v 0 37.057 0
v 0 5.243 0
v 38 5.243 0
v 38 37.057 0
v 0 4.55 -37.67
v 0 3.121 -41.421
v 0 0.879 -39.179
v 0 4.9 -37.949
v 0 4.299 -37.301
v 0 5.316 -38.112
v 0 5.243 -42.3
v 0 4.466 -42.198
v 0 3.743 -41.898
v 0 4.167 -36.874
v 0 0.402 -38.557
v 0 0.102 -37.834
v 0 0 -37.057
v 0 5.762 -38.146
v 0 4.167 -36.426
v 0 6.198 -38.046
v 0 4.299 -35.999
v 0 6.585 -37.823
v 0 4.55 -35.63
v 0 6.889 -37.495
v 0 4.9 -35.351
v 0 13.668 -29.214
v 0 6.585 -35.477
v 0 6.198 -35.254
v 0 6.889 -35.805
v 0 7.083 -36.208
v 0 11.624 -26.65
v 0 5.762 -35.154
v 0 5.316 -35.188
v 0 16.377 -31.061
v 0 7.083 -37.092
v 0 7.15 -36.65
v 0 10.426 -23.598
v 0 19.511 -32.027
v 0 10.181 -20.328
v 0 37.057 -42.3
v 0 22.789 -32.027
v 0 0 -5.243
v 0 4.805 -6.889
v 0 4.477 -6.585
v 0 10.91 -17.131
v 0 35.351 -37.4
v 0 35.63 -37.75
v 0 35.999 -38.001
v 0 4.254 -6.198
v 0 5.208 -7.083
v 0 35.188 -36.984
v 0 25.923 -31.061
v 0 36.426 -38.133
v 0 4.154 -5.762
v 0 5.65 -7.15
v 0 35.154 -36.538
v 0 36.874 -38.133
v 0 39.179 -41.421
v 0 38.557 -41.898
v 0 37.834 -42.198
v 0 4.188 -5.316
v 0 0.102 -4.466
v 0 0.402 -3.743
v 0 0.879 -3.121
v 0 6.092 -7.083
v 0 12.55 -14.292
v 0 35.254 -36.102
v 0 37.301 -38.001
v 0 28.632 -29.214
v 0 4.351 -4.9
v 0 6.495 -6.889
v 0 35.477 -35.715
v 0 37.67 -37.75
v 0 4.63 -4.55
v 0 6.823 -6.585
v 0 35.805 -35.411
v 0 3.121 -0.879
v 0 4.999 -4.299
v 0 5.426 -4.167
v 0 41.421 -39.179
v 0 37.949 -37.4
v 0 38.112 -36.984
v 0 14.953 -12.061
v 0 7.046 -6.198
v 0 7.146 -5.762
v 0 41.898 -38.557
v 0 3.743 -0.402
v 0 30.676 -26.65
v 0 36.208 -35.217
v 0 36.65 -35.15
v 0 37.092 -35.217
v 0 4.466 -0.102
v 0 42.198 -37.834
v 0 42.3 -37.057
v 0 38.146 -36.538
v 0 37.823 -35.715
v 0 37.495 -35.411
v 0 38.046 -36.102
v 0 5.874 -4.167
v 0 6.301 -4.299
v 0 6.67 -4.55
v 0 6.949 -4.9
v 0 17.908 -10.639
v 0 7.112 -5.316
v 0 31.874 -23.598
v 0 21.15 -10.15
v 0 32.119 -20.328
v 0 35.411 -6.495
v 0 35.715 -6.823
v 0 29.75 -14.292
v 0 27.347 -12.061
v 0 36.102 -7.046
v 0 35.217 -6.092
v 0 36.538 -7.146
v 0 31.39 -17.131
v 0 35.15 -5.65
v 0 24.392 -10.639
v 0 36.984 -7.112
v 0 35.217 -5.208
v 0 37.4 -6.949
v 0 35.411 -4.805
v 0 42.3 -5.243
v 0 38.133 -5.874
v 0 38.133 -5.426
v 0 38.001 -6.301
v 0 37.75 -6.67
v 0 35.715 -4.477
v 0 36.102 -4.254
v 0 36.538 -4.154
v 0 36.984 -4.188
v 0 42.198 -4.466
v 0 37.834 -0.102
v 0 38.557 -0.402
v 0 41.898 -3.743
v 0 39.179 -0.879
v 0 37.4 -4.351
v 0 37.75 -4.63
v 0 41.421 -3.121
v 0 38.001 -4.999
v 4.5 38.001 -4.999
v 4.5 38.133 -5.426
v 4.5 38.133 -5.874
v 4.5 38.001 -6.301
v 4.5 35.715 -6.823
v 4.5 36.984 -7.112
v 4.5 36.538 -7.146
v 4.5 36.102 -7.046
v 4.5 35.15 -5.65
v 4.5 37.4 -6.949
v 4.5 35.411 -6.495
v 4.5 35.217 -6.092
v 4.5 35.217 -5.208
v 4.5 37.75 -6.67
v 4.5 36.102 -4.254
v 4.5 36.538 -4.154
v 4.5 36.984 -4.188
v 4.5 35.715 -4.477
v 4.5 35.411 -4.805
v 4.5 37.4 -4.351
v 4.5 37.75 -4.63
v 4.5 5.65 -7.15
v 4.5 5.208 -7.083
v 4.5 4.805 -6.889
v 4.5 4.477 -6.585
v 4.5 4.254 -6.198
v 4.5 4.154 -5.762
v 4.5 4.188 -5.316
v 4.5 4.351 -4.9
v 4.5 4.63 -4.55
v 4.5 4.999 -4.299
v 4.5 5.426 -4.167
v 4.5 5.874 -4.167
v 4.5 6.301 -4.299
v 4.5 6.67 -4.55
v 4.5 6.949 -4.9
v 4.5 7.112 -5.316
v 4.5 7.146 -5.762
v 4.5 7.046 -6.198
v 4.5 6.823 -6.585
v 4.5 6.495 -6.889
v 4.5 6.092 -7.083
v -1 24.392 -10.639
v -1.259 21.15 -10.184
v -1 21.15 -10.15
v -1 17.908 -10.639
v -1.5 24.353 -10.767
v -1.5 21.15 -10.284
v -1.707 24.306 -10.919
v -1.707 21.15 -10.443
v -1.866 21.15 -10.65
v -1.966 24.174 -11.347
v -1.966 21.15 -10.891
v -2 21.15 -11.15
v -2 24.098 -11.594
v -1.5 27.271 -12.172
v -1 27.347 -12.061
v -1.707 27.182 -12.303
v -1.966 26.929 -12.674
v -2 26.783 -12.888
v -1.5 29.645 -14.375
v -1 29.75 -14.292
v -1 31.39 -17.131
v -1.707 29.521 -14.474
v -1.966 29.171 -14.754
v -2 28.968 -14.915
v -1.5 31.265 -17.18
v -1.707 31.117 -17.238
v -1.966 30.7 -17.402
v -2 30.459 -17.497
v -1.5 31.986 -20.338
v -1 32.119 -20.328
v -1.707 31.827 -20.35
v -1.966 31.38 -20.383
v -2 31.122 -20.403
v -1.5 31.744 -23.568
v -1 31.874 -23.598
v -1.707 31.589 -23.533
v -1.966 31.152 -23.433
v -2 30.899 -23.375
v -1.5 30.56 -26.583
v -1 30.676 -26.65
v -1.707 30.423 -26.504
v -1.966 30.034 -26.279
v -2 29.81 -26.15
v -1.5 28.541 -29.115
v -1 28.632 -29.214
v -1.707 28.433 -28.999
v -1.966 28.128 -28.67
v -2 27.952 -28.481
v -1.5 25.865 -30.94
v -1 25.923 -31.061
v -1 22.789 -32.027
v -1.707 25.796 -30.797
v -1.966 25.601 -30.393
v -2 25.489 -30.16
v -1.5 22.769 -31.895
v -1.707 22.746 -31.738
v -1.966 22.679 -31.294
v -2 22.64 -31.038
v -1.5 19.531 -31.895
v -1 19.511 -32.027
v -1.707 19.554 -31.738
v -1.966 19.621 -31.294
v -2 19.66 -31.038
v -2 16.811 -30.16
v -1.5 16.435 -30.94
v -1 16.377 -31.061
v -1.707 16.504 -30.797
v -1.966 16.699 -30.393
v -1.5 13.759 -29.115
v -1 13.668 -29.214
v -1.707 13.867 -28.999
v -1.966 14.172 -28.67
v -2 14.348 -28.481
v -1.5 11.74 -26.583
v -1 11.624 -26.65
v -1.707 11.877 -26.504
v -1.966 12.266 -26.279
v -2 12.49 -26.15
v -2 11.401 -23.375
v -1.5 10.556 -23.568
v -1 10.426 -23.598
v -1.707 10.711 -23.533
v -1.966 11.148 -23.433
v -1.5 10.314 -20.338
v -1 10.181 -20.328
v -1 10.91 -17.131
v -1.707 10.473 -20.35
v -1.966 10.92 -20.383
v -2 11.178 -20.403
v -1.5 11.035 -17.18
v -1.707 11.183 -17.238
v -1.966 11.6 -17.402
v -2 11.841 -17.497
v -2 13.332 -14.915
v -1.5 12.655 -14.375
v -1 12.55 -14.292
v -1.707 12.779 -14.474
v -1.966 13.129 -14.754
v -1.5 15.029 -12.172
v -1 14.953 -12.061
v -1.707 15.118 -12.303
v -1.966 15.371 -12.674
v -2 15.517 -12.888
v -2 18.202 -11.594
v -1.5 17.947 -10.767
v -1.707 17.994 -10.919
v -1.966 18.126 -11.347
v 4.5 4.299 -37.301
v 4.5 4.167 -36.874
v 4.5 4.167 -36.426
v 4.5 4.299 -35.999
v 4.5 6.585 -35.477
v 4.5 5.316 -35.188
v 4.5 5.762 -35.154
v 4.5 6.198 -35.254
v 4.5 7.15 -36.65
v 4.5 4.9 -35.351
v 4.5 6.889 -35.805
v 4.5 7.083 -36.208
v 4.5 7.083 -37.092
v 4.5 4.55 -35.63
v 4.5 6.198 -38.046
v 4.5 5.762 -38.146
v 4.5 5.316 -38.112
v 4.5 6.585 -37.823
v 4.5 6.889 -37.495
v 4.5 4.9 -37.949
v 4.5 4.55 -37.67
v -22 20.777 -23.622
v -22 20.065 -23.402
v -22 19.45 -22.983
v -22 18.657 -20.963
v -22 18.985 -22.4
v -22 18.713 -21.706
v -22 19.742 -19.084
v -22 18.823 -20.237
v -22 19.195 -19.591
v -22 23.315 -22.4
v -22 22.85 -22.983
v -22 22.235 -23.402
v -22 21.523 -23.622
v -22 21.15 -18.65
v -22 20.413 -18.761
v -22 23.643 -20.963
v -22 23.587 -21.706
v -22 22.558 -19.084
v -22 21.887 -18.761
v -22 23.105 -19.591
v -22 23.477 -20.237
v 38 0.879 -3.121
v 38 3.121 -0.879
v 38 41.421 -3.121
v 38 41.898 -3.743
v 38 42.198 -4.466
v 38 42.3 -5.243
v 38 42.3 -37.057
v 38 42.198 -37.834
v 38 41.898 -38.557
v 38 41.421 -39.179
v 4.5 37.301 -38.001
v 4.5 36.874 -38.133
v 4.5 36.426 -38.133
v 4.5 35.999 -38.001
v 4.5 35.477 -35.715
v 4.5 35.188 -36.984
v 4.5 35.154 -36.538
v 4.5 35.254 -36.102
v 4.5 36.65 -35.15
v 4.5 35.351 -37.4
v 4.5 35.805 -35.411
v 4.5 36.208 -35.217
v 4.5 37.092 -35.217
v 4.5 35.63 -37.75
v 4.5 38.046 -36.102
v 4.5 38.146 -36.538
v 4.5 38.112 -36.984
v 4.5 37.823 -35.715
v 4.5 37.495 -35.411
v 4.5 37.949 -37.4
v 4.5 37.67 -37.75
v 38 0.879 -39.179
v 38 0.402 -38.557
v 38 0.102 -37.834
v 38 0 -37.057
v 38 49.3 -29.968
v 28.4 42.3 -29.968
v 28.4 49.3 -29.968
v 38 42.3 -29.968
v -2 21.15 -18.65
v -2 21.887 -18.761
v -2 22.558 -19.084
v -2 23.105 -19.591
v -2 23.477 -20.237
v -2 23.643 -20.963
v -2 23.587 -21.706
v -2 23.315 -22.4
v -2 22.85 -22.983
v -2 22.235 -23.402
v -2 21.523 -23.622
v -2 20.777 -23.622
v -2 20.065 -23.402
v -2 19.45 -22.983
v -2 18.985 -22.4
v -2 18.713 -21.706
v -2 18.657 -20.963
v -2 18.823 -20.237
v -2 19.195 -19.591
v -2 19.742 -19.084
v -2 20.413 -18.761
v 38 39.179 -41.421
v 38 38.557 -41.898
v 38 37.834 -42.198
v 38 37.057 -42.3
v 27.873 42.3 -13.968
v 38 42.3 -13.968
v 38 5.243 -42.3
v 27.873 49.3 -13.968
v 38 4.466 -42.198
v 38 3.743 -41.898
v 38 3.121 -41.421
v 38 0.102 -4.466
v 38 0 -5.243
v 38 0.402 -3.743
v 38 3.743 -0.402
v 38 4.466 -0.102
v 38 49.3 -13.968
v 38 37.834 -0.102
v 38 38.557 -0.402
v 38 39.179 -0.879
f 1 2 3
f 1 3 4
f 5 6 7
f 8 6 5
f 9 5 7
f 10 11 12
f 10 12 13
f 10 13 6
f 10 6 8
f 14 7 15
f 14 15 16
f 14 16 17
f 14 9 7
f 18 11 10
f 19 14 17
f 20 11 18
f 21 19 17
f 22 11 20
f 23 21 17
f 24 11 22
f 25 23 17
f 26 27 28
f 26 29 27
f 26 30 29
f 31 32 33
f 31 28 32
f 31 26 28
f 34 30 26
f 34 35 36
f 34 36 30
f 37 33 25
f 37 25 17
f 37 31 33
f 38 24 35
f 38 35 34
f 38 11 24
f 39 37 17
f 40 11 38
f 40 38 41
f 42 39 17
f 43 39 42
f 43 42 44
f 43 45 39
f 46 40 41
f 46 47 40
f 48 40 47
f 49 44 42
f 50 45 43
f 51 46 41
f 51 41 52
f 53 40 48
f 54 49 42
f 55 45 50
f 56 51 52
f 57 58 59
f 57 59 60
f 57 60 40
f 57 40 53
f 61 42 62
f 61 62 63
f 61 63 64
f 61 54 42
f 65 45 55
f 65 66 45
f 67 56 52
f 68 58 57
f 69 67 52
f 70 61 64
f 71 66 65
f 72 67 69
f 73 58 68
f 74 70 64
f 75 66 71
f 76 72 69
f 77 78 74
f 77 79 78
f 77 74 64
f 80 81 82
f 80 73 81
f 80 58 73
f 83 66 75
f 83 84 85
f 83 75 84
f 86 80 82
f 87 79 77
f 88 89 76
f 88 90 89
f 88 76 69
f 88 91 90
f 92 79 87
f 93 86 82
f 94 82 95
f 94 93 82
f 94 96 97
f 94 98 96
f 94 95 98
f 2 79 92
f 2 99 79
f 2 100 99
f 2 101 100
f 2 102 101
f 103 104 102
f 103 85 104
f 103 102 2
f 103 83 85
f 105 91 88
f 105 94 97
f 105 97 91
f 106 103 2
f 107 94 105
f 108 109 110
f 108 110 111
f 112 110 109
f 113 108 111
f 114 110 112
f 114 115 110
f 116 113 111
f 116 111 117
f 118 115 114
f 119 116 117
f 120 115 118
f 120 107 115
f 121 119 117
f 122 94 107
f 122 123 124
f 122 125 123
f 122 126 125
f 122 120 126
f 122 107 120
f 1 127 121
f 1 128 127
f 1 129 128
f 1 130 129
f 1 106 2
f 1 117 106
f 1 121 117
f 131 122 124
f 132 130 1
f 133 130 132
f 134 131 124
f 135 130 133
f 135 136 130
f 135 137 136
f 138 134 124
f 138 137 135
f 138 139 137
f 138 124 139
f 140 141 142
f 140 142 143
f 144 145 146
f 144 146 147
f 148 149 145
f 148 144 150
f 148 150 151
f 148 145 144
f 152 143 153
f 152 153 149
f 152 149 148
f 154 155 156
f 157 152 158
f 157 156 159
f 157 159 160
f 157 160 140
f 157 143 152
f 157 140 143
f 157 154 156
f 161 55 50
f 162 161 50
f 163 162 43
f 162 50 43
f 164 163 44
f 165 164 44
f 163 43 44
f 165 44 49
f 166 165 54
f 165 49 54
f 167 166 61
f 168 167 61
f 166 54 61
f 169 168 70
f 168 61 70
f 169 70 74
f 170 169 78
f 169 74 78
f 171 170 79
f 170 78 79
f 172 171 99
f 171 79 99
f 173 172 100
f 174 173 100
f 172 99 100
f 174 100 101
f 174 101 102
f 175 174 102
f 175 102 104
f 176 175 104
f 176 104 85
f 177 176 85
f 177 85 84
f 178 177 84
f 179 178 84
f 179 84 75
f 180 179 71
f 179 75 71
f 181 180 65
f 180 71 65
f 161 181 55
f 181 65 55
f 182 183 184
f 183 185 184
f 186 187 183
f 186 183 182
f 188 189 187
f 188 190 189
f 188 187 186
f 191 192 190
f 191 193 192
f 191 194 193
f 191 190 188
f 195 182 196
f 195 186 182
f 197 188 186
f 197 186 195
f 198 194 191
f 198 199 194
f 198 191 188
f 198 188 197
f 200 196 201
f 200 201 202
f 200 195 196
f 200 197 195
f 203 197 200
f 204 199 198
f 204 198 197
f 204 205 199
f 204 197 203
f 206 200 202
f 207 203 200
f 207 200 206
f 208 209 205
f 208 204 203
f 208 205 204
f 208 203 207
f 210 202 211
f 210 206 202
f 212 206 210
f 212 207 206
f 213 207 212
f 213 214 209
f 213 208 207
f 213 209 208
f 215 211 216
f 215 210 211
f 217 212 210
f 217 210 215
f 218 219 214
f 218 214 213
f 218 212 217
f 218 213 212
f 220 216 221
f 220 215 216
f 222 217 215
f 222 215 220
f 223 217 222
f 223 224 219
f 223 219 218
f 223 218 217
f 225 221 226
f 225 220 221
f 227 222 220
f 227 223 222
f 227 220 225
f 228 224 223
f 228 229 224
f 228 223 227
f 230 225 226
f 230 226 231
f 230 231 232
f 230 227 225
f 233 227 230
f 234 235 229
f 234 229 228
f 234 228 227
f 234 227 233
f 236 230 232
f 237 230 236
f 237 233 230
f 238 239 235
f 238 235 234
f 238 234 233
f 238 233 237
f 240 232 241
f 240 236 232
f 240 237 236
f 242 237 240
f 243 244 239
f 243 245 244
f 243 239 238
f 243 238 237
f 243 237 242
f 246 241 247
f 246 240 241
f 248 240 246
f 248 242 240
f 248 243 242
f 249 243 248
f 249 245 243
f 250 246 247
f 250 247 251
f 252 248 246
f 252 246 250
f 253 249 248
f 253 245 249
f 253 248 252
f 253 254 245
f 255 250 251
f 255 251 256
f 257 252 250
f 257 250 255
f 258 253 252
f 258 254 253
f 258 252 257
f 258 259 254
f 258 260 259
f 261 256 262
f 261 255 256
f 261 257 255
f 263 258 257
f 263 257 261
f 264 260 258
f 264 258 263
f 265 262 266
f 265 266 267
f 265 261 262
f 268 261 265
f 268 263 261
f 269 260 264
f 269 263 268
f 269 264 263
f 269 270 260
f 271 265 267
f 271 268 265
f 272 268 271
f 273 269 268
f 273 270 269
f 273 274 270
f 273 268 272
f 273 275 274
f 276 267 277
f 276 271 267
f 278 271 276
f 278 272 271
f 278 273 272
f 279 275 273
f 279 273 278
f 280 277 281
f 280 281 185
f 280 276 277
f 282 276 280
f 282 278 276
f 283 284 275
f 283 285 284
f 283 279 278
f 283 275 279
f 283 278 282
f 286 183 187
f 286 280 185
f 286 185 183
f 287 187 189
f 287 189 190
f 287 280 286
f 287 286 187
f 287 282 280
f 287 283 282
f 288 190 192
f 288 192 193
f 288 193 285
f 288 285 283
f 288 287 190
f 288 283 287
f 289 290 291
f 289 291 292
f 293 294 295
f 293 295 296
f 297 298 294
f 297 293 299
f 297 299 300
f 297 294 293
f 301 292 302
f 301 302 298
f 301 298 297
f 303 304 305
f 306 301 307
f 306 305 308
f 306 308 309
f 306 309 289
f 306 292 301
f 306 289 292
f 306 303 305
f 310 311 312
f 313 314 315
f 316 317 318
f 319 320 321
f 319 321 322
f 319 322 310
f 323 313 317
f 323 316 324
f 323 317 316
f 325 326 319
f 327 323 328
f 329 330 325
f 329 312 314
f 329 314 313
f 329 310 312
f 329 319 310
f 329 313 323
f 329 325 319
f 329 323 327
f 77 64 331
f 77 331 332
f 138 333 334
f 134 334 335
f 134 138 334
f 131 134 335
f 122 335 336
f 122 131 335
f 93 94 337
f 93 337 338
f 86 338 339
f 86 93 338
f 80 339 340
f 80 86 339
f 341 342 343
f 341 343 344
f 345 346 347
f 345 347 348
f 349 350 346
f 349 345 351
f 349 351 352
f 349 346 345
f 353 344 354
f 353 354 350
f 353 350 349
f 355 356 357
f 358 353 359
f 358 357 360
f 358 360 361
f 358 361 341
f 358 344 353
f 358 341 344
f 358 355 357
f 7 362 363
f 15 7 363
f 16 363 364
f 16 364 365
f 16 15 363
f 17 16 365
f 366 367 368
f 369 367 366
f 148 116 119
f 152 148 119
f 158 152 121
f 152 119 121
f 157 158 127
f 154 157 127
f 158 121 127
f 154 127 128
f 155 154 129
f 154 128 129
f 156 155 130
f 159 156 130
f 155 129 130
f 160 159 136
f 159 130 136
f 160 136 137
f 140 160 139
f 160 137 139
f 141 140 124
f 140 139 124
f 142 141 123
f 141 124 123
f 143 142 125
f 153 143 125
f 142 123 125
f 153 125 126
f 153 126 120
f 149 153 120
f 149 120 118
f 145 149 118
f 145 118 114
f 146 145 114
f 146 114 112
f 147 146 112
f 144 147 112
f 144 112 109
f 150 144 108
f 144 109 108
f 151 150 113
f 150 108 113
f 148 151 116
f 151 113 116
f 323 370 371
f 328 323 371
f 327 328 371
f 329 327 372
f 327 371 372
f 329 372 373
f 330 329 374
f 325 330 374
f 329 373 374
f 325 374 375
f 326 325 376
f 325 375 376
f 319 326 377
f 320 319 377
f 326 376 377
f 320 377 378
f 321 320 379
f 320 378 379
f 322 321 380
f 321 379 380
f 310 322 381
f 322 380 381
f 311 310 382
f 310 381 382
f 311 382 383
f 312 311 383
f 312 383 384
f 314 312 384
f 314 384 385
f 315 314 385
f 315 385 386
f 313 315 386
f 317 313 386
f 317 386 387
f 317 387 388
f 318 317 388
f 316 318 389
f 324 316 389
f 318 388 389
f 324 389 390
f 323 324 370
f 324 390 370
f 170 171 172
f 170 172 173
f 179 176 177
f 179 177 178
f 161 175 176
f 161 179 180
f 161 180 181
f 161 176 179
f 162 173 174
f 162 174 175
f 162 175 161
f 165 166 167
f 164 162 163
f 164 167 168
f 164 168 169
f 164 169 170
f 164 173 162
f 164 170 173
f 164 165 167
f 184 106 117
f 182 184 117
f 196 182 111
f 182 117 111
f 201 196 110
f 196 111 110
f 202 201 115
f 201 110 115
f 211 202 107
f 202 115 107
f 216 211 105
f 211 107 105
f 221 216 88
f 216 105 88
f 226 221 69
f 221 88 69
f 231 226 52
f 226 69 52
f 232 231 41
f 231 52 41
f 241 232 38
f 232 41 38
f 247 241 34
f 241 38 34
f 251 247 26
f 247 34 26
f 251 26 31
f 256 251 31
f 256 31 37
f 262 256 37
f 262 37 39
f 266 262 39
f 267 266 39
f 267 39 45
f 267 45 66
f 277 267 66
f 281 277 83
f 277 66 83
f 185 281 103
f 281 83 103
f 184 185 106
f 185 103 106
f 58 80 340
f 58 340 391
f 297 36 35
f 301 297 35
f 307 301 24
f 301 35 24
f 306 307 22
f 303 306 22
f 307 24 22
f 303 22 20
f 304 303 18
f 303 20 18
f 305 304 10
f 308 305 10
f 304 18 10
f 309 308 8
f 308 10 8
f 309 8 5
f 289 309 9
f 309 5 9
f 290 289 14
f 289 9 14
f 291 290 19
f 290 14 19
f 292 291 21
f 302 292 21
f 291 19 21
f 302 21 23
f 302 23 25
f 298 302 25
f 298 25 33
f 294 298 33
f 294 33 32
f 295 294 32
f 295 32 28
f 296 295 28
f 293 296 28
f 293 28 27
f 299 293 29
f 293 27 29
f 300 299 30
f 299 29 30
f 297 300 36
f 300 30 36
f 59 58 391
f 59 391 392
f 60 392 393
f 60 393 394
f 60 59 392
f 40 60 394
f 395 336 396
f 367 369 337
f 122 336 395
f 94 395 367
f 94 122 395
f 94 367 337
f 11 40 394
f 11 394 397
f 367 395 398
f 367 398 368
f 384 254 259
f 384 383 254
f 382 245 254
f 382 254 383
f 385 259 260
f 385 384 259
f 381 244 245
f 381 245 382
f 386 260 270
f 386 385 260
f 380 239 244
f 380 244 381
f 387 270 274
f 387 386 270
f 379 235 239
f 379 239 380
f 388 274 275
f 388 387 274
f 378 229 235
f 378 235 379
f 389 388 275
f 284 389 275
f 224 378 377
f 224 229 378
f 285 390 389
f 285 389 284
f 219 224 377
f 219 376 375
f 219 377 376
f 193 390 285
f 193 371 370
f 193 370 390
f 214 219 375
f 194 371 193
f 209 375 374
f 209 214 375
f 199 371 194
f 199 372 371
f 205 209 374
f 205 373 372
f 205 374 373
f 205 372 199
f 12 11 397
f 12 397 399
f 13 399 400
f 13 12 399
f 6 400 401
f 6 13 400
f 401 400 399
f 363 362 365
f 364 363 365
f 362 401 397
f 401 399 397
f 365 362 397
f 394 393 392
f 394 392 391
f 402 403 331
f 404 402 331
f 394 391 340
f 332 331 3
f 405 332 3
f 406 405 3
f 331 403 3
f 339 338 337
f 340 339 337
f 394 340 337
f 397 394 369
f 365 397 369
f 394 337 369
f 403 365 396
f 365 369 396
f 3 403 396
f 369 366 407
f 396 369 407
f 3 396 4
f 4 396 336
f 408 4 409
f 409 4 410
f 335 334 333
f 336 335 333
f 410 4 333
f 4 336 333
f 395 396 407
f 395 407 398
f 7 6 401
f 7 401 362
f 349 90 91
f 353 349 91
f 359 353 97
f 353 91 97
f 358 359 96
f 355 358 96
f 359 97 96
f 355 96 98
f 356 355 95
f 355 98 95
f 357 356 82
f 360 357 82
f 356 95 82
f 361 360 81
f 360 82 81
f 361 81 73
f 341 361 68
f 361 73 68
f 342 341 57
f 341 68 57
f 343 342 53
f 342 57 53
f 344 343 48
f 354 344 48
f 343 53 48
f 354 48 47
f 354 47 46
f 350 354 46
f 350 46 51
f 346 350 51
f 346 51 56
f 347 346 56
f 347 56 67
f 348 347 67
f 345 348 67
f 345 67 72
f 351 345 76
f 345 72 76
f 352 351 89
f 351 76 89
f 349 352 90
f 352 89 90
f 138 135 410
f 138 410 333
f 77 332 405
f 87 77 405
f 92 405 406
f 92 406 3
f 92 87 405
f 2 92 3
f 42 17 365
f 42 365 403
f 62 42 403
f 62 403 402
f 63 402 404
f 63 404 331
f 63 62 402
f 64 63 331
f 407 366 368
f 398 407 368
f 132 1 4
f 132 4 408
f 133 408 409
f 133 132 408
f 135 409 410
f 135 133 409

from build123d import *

# Parameters (mm, degrees)
EXTRUDE_2_DEPTH          = 38
SKETCH_2_R               = 11
EXTRUDE_3_DEPTH          = 2
FILLET_1_R               = 1
SKETCH_3_R               = 2.5
EXTRUDE_4_DEPTH          = 20
SKETCH_4_R               = 1.5
CUT_EXTRUDE_1_DEPTH      = 4.5
PATTERN_CIRCULAR_1_COUNT = 4
EXTRUDE_5_DEPTH          = 7


with BuildPart() as part:
    # 草图1 → 凸台-拉伸2 (new body)
    with BuildSketch(Plane(origin=(0, 0, 0), x_dir=(0, 0, -1), z_dir=(1, 0, 0))):
        with BuildLine():
            Line((0.878679656, 39.178679656), (3.121320344, 41.421320344))
            ThreePointArc((3.121320344, 41.421320344), (4.09459039, 42.071638598), (5.242640687, 42.3))
            Line((5.242640687, 42.3), (37.057359313, 42.3))
            ThreePointArc((37.057359313, 42.3), (38.20540961, 42.071638598), (39.178679656, 41.421320344))
            Line((39.178679656, 41.421320344), (41.421320344, 39.178679656))
            ThreePointArc((41.421320344, 39.178679656), (42.071638598, 38.20540961), (42.3, 37.057359313))
            Line((42.3, 37.057359313), (42.3, 5.242640687))
            ThreePointArc((42.3, 5.242640687), (42.071638598, 4.09459039), (41.421320344, 3.121320344))
            Line((41.421320344, 3.121320344), (39.178679656, 0.878679656))
            ThreePointArc((39.178679656, 0.878679656), (38.20540961, 0.228361402), (37.057359313, 0))
            Line((37.057359313, 0), (5.242640687, 0))
            ThreePointArc((5.242640687, 0), (4.09459039, 0.228361402), (3.121320344, 0.878679656))
            Line((3.121320344, 0.878679656), (0.878679656, 3.121320344))
            ThreePointArc((0.878679656, 3.121320344), (0.228361402, 4.09459039), (0, 5.242640687))
            Line((0, 5.242640687), (0, 37.057359313))
            ThreePointArc((0, 37.057359313), (0.228361402, 38.20540961), (0.878679656, 39.178679656))
        make_face()
    extrude(amount=EXTRUDE_2_DEPTH)

    # 草图2 → 凸台-拉伸3 (add)
    with BuildSketch(Plane.ZY):
        with Locations((-21.15, 21.15)):
            Circle(SKETCH_2_R)
    extrude(amount=EXTRUDE_3_DEPTH)

    # 圆角1
    fillet_1_edges = [part.edges().sort_by_distance(p)[0] for p in [
        (-2, 21.15, -32.15),
    ]]
    fillet(fillet_1_edges, radius=FILLET_1_R)

    # 草图3 → 凸台-拉伸4 (add)
    with BuildSketch(Plane.ZY.offset(2)):
        with Locations((-21.15, 21.15)):
            Circle(SKETCH_3_R)
    extrude(amount=EXTRUDE_4_DEPTH)

    # 草图4 → 切除-拉伸1 (cut)
    with BuildSketch(Plane.ZY):
        with Locations((-36.65, 36.65)):
            Circle(SKETCH_4_R)
    cut_extrude_1 = extrude(amount=-CUT_EXTRUDE_1_DEPTH, mode=Mode.SUBTRACT)

    # 阵列(圆周)1: 切除-拉伸1 ×4 about axis
    pattern_circular_1_axis = Axis((0, 21.15, -21.15), (1, 0, 0))
    for i in range(1, PATTERN_CIRCULAR_1_COUNT):
        add(cut_extrude_1.rotate(pattern_circular_1_axis, i * 360 / PATTERN_CIRCULAR_1_COUNT), mode=Mode.SUBTRACT)

    # 草图6 → 凸台-拉伸5 (add)
    with BuildSketch(Plane(origin=(0, 42.3, 0), x_dir=(1, 0, 0), z_dir=(0, 1, 0))):
        Polygon((28.4, 29.967521896), (38, 29.967521896), (38, 13.967521896), (27.87263434, 13.967521896), align=None)
    extrude(amount=EXTRUDE_5_DEPTH)


solid = part.part
